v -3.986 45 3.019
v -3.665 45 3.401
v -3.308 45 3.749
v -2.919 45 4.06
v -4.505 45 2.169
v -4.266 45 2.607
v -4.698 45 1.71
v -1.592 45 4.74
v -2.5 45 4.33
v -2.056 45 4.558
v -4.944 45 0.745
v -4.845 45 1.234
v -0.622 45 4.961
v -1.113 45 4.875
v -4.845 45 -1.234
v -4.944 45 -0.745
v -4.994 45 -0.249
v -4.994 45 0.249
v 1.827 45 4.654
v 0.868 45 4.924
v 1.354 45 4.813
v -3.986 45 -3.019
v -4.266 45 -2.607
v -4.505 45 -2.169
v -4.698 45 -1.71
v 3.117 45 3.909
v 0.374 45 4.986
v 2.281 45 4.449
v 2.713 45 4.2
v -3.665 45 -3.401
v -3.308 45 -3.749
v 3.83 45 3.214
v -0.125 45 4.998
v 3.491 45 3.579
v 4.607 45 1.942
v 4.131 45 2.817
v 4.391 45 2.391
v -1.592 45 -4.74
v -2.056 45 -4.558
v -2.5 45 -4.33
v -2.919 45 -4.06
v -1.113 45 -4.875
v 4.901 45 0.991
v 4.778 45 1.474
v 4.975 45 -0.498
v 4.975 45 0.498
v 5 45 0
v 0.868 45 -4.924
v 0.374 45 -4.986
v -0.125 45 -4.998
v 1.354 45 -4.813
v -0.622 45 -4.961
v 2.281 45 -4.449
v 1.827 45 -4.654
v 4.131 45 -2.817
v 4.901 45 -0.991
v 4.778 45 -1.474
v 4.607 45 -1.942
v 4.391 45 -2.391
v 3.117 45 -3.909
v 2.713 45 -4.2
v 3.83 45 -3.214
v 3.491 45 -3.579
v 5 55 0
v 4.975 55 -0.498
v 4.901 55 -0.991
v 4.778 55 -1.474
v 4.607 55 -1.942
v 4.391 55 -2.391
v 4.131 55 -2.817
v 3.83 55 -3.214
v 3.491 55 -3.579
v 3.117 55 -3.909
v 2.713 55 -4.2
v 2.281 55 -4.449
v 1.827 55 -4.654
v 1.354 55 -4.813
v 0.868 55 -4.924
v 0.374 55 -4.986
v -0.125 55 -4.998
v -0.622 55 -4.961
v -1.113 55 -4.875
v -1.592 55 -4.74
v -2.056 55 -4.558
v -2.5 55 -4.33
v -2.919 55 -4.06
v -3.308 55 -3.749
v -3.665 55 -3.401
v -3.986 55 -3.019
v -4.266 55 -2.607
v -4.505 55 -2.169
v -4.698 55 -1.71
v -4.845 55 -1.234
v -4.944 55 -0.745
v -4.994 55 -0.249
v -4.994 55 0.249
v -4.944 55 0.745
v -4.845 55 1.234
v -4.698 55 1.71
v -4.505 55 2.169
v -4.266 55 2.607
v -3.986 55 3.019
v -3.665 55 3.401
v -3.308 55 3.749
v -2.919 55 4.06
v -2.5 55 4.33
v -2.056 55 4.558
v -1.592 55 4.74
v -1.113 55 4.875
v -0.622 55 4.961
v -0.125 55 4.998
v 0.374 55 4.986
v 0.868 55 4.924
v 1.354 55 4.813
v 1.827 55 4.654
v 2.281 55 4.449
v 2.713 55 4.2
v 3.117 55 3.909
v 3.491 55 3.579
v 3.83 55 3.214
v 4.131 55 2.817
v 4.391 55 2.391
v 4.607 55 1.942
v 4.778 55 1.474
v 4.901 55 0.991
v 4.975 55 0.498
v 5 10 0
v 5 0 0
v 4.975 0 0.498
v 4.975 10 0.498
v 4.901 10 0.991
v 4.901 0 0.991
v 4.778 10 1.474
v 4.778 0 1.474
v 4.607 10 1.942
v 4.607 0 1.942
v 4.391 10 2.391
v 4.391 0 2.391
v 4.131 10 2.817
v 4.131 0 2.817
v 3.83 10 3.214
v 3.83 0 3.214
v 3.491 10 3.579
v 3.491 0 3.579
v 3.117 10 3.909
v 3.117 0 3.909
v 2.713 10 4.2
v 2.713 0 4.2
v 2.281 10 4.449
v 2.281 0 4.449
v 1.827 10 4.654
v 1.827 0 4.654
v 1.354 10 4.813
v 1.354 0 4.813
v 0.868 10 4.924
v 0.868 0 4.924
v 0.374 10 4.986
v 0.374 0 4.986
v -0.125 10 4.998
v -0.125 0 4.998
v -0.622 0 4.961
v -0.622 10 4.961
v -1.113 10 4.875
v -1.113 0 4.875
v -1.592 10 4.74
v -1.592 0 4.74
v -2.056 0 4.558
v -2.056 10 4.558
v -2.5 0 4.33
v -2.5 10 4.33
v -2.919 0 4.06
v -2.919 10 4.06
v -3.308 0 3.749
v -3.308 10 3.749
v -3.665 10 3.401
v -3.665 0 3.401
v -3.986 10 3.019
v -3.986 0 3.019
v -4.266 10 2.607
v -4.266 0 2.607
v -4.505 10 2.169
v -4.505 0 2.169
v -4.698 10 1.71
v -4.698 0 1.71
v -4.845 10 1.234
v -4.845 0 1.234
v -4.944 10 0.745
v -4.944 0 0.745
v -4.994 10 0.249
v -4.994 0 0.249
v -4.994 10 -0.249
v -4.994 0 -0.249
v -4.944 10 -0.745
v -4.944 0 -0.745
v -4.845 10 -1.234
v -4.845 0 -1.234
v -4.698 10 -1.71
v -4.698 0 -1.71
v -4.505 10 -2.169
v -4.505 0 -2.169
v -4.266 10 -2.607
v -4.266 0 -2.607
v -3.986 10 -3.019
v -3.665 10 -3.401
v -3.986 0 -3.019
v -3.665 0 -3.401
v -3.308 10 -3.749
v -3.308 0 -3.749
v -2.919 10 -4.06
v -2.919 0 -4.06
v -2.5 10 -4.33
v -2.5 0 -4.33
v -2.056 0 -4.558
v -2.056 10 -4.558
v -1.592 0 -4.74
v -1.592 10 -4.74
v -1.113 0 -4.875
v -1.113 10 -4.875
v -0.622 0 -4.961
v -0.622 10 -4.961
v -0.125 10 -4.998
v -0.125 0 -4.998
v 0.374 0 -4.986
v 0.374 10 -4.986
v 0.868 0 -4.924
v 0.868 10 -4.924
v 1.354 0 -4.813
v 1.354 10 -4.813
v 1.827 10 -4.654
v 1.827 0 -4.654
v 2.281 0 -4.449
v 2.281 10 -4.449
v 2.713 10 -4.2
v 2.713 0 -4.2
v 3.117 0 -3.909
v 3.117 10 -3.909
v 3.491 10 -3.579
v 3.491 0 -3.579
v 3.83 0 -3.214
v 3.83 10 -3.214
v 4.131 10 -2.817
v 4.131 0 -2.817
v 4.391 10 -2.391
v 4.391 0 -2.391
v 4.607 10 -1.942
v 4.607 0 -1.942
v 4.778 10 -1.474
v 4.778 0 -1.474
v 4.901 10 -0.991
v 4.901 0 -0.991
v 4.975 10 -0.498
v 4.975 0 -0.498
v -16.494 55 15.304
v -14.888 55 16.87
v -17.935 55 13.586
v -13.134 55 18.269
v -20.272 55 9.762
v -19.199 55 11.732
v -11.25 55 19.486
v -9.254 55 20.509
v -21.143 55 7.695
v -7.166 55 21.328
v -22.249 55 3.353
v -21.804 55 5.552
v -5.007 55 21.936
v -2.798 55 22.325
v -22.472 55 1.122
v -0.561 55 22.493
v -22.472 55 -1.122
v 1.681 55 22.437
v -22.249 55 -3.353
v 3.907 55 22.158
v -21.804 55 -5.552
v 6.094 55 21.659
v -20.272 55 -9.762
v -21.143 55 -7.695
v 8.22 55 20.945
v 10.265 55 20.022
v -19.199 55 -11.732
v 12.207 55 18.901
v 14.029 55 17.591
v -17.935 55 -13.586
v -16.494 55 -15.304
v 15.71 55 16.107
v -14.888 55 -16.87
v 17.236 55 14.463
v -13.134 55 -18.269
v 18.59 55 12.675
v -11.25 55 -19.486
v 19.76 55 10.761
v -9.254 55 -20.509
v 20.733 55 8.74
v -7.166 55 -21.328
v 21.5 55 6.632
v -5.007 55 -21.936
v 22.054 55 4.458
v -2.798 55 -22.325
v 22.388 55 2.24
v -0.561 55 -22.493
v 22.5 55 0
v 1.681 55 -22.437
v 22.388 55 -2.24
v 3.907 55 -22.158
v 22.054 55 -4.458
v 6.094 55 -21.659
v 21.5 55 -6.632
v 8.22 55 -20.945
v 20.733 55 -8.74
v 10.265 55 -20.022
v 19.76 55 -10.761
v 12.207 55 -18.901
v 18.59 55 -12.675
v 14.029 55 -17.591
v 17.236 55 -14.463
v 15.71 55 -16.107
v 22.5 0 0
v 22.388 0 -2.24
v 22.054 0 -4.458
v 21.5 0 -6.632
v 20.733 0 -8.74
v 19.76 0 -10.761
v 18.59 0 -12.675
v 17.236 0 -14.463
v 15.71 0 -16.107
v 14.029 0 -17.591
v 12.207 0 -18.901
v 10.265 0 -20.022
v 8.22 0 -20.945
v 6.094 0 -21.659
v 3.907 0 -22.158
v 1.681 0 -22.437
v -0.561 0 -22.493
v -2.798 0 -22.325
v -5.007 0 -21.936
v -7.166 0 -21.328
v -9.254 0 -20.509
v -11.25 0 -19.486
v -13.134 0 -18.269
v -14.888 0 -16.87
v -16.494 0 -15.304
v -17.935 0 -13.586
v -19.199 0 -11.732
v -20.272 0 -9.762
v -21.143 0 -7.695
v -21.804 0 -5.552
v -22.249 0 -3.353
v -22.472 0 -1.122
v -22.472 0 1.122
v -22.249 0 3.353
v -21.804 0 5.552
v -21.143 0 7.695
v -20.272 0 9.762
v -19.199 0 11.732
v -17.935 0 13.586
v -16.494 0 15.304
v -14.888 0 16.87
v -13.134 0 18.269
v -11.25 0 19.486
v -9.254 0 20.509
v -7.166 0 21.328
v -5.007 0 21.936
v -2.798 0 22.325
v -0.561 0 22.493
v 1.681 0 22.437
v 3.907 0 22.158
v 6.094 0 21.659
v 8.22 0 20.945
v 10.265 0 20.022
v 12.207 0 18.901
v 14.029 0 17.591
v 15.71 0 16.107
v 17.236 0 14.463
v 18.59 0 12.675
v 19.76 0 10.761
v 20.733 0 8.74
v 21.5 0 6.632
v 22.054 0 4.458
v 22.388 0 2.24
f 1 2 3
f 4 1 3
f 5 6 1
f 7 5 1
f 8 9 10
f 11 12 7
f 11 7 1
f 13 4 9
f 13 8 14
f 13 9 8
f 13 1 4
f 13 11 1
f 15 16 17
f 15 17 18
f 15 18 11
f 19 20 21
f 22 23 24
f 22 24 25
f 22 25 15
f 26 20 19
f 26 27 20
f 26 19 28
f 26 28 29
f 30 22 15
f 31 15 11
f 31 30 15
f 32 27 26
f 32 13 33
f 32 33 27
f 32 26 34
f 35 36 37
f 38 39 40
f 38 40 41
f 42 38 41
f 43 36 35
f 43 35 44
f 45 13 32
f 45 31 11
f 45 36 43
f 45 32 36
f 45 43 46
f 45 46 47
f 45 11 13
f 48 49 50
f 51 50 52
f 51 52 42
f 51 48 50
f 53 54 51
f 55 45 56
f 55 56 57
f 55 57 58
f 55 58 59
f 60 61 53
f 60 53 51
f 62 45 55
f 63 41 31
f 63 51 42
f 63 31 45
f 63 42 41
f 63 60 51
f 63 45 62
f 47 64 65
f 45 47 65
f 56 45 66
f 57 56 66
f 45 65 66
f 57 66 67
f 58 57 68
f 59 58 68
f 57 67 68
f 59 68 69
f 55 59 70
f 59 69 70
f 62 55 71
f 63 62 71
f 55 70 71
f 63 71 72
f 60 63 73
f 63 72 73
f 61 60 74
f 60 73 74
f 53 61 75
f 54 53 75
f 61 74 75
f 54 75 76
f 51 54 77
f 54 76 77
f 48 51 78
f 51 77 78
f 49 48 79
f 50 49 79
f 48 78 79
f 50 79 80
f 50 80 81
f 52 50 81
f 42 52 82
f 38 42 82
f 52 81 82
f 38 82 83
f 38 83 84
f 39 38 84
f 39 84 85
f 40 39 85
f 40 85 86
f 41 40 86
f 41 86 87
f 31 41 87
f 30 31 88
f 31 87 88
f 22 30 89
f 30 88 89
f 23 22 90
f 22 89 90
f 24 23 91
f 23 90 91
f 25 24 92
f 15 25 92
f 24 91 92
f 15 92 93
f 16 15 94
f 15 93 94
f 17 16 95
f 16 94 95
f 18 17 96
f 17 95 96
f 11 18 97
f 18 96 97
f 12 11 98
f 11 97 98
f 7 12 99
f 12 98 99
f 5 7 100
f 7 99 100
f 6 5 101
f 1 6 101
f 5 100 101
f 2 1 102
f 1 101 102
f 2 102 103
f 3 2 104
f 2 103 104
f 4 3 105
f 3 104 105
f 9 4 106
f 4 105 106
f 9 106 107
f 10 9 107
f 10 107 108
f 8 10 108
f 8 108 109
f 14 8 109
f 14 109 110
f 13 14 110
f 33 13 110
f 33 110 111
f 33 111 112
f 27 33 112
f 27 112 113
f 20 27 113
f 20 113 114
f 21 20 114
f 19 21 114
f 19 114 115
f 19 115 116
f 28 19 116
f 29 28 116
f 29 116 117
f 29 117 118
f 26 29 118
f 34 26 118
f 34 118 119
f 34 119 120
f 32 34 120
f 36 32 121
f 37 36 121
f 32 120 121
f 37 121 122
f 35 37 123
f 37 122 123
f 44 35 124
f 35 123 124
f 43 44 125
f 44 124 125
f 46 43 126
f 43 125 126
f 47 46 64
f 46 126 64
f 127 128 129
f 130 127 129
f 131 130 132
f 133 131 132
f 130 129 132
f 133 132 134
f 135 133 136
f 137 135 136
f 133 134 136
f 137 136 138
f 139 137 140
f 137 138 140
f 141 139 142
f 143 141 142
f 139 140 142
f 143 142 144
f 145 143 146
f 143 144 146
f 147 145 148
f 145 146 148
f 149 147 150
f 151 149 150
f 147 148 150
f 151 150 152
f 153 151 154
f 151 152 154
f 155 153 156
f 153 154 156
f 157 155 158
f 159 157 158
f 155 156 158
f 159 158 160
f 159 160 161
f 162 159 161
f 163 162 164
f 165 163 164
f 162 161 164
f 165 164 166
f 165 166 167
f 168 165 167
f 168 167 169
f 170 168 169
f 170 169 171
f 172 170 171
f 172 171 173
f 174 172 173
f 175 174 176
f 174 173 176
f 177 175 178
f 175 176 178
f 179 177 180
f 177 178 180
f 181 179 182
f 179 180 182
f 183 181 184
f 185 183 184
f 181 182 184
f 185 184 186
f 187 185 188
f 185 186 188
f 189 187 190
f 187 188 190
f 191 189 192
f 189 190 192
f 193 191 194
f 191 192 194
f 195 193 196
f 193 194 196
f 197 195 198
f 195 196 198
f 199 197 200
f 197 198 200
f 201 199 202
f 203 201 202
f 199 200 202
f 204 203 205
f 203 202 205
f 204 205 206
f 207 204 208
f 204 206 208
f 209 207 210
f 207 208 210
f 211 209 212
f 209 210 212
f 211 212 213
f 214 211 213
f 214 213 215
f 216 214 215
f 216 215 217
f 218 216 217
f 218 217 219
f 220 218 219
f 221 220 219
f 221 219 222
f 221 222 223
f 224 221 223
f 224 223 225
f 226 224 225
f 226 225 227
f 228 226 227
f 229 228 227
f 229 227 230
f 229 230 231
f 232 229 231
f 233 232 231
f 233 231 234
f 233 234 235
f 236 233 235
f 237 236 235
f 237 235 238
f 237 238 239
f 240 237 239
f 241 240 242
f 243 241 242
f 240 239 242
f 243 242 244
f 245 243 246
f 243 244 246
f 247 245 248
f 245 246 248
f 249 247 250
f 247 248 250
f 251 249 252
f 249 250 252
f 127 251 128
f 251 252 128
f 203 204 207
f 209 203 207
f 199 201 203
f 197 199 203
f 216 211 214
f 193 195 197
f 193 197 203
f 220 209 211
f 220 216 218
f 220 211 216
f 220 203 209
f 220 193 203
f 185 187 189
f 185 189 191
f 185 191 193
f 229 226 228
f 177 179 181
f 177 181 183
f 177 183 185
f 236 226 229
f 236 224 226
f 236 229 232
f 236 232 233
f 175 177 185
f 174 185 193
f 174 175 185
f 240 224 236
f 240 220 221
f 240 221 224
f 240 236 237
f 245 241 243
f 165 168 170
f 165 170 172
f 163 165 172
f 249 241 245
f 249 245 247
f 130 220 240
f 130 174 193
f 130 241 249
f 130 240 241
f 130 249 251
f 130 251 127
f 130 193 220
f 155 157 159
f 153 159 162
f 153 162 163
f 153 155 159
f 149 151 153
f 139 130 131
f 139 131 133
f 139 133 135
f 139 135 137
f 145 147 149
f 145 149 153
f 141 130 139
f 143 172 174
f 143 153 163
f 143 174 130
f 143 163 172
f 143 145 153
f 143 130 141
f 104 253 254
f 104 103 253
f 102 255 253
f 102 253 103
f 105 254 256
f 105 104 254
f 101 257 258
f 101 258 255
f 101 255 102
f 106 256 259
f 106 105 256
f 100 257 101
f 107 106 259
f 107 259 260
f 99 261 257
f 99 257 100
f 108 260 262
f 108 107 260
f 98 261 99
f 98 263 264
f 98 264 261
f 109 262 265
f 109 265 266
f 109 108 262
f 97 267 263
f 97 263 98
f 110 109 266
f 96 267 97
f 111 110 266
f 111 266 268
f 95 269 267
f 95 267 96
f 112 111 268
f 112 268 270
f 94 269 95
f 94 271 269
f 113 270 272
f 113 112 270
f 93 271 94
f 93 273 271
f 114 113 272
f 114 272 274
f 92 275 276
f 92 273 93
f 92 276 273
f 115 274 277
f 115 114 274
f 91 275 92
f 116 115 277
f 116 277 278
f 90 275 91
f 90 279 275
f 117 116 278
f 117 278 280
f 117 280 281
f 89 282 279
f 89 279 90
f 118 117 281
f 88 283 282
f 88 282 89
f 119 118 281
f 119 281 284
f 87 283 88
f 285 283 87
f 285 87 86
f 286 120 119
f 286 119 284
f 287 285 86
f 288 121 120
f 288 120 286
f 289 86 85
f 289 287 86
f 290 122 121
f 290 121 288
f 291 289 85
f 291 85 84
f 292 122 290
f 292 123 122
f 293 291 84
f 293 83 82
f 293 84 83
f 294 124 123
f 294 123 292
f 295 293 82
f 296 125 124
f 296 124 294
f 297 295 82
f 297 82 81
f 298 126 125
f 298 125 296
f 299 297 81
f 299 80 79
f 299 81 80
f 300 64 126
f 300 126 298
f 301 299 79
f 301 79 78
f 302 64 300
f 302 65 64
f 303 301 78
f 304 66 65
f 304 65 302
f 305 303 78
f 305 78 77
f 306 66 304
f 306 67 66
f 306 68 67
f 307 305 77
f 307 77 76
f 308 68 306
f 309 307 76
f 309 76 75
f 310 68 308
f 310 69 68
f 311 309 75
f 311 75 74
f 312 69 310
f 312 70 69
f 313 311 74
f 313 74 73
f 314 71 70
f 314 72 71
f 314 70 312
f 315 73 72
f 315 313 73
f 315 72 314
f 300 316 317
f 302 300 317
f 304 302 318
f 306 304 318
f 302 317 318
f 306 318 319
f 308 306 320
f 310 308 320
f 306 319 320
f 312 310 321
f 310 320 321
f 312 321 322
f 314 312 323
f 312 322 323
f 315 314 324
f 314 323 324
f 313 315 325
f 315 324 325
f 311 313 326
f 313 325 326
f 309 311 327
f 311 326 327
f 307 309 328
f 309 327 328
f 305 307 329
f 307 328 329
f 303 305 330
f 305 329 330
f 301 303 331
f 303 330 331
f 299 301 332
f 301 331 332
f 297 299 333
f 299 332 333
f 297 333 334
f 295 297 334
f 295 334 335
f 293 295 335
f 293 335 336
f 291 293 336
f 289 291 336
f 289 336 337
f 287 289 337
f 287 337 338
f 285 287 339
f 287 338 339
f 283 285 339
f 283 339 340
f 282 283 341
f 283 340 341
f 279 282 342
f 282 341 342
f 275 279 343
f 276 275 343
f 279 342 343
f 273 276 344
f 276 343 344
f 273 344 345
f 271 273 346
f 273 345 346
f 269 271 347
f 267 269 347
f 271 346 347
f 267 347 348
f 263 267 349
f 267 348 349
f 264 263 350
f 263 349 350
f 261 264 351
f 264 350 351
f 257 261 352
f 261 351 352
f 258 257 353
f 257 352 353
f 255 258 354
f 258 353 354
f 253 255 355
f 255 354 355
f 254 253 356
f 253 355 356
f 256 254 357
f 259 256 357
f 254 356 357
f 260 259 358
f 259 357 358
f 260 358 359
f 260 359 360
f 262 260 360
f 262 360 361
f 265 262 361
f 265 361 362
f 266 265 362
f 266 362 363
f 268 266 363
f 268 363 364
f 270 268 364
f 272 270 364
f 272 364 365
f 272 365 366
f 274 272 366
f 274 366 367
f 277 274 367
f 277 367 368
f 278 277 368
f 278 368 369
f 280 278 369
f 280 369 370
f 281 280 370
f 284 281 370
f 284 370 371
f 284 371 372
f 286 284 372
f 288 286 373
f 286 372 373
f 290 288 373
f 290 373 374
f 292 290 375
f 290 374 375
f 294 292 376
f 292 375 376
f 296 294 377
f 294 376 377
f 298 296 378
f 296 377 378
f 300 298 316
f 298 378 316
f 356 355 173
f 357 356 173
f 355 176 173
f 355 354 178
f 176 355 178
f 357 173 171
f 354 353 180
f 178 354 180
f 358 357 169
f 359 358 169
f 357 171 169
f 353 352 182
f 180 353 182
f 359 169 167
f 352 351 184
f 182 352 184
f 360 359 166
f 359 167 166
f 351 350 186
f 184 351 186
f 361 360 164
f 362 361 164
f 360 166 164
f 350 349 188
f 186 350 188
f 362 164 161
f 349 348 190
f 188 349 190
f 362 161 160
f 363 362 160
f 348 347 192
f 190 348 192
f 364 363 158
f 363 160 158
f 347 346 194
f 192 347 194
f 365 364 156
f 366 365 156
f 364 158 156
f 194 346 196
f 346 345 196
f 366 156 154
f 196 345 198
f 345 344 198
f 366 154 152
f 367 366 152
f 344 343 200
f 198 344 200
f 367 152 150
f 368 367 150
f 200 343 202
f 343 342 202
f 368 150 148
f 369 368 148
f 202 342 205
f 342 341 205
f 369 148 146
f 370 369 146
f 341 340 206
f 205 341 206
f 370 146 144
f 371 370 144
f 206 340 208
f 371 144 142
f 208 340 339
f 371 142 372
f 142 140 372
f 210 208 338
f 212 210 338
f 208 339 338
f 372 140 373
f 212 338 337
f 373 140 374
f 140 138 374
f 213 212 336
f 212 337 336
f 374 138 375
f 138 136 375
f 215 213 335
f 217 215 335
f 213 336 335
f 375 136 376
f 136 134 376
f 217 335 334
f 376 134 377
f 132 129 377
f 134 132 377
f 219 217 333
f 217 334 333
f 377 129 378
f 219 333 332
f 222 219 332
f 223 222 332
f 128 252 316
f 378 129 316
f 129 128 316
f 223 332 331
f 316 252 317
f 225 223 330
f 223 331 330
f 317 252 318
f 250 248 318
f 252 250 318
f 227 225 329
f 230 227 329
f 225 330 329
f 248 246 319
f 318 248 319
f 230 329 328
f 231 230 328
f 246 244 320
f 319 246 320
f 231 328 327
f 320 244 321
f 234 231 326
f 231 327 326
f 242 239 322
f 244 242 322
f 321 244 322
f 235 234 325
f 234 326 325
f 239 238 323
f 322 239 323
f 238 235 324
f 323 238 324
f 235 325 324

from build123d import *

# Parameters (mm, degrees)
SKETCH1_R           = 22.5
BOSS_EXTRUDE1_DEPTH = 55
SKETCH2_R           = 5
CUT_EXTRUDE1_DEPTH  = 10
SKETCH3_R           = 5
CUT_EXTRUDE2_DEPTH  = 10


with BuildPart() as part:
    # Sketch1 → Boss-Extrude1 (new body)
    with BuildSketch(Plane(origin=(0, 0, 0), x_dir=(1, 0, 0), z_dir=(0, 1, 0))):
        Circle(SKETCH1_R)
    extrude(amount=BOSS_EXTRUDE1_DEPTH)

    # Sketch2 → Cut-Extrude1 (cut)
    with BuildSketch(Plane(origin=(0, 55, 0), x_dir=(1, 0, 0), z_dir=(0, 1, 0))):
        Circle(SKETCH2_R)
    extrude(amount=-CUT_EXTRUDE1_DEPTH, mode=Mode.SUBTRACT)

    # Sketch3 → Cut-Extrude2 (cut)
    with BuildSketch(Plane.XZ):
        Circle(SKETCH3_R)
    extrude(amount=-CUT_EXTRUDE2_DEPTH, mode=Mode.SUBTRACT)


solid = part.part
